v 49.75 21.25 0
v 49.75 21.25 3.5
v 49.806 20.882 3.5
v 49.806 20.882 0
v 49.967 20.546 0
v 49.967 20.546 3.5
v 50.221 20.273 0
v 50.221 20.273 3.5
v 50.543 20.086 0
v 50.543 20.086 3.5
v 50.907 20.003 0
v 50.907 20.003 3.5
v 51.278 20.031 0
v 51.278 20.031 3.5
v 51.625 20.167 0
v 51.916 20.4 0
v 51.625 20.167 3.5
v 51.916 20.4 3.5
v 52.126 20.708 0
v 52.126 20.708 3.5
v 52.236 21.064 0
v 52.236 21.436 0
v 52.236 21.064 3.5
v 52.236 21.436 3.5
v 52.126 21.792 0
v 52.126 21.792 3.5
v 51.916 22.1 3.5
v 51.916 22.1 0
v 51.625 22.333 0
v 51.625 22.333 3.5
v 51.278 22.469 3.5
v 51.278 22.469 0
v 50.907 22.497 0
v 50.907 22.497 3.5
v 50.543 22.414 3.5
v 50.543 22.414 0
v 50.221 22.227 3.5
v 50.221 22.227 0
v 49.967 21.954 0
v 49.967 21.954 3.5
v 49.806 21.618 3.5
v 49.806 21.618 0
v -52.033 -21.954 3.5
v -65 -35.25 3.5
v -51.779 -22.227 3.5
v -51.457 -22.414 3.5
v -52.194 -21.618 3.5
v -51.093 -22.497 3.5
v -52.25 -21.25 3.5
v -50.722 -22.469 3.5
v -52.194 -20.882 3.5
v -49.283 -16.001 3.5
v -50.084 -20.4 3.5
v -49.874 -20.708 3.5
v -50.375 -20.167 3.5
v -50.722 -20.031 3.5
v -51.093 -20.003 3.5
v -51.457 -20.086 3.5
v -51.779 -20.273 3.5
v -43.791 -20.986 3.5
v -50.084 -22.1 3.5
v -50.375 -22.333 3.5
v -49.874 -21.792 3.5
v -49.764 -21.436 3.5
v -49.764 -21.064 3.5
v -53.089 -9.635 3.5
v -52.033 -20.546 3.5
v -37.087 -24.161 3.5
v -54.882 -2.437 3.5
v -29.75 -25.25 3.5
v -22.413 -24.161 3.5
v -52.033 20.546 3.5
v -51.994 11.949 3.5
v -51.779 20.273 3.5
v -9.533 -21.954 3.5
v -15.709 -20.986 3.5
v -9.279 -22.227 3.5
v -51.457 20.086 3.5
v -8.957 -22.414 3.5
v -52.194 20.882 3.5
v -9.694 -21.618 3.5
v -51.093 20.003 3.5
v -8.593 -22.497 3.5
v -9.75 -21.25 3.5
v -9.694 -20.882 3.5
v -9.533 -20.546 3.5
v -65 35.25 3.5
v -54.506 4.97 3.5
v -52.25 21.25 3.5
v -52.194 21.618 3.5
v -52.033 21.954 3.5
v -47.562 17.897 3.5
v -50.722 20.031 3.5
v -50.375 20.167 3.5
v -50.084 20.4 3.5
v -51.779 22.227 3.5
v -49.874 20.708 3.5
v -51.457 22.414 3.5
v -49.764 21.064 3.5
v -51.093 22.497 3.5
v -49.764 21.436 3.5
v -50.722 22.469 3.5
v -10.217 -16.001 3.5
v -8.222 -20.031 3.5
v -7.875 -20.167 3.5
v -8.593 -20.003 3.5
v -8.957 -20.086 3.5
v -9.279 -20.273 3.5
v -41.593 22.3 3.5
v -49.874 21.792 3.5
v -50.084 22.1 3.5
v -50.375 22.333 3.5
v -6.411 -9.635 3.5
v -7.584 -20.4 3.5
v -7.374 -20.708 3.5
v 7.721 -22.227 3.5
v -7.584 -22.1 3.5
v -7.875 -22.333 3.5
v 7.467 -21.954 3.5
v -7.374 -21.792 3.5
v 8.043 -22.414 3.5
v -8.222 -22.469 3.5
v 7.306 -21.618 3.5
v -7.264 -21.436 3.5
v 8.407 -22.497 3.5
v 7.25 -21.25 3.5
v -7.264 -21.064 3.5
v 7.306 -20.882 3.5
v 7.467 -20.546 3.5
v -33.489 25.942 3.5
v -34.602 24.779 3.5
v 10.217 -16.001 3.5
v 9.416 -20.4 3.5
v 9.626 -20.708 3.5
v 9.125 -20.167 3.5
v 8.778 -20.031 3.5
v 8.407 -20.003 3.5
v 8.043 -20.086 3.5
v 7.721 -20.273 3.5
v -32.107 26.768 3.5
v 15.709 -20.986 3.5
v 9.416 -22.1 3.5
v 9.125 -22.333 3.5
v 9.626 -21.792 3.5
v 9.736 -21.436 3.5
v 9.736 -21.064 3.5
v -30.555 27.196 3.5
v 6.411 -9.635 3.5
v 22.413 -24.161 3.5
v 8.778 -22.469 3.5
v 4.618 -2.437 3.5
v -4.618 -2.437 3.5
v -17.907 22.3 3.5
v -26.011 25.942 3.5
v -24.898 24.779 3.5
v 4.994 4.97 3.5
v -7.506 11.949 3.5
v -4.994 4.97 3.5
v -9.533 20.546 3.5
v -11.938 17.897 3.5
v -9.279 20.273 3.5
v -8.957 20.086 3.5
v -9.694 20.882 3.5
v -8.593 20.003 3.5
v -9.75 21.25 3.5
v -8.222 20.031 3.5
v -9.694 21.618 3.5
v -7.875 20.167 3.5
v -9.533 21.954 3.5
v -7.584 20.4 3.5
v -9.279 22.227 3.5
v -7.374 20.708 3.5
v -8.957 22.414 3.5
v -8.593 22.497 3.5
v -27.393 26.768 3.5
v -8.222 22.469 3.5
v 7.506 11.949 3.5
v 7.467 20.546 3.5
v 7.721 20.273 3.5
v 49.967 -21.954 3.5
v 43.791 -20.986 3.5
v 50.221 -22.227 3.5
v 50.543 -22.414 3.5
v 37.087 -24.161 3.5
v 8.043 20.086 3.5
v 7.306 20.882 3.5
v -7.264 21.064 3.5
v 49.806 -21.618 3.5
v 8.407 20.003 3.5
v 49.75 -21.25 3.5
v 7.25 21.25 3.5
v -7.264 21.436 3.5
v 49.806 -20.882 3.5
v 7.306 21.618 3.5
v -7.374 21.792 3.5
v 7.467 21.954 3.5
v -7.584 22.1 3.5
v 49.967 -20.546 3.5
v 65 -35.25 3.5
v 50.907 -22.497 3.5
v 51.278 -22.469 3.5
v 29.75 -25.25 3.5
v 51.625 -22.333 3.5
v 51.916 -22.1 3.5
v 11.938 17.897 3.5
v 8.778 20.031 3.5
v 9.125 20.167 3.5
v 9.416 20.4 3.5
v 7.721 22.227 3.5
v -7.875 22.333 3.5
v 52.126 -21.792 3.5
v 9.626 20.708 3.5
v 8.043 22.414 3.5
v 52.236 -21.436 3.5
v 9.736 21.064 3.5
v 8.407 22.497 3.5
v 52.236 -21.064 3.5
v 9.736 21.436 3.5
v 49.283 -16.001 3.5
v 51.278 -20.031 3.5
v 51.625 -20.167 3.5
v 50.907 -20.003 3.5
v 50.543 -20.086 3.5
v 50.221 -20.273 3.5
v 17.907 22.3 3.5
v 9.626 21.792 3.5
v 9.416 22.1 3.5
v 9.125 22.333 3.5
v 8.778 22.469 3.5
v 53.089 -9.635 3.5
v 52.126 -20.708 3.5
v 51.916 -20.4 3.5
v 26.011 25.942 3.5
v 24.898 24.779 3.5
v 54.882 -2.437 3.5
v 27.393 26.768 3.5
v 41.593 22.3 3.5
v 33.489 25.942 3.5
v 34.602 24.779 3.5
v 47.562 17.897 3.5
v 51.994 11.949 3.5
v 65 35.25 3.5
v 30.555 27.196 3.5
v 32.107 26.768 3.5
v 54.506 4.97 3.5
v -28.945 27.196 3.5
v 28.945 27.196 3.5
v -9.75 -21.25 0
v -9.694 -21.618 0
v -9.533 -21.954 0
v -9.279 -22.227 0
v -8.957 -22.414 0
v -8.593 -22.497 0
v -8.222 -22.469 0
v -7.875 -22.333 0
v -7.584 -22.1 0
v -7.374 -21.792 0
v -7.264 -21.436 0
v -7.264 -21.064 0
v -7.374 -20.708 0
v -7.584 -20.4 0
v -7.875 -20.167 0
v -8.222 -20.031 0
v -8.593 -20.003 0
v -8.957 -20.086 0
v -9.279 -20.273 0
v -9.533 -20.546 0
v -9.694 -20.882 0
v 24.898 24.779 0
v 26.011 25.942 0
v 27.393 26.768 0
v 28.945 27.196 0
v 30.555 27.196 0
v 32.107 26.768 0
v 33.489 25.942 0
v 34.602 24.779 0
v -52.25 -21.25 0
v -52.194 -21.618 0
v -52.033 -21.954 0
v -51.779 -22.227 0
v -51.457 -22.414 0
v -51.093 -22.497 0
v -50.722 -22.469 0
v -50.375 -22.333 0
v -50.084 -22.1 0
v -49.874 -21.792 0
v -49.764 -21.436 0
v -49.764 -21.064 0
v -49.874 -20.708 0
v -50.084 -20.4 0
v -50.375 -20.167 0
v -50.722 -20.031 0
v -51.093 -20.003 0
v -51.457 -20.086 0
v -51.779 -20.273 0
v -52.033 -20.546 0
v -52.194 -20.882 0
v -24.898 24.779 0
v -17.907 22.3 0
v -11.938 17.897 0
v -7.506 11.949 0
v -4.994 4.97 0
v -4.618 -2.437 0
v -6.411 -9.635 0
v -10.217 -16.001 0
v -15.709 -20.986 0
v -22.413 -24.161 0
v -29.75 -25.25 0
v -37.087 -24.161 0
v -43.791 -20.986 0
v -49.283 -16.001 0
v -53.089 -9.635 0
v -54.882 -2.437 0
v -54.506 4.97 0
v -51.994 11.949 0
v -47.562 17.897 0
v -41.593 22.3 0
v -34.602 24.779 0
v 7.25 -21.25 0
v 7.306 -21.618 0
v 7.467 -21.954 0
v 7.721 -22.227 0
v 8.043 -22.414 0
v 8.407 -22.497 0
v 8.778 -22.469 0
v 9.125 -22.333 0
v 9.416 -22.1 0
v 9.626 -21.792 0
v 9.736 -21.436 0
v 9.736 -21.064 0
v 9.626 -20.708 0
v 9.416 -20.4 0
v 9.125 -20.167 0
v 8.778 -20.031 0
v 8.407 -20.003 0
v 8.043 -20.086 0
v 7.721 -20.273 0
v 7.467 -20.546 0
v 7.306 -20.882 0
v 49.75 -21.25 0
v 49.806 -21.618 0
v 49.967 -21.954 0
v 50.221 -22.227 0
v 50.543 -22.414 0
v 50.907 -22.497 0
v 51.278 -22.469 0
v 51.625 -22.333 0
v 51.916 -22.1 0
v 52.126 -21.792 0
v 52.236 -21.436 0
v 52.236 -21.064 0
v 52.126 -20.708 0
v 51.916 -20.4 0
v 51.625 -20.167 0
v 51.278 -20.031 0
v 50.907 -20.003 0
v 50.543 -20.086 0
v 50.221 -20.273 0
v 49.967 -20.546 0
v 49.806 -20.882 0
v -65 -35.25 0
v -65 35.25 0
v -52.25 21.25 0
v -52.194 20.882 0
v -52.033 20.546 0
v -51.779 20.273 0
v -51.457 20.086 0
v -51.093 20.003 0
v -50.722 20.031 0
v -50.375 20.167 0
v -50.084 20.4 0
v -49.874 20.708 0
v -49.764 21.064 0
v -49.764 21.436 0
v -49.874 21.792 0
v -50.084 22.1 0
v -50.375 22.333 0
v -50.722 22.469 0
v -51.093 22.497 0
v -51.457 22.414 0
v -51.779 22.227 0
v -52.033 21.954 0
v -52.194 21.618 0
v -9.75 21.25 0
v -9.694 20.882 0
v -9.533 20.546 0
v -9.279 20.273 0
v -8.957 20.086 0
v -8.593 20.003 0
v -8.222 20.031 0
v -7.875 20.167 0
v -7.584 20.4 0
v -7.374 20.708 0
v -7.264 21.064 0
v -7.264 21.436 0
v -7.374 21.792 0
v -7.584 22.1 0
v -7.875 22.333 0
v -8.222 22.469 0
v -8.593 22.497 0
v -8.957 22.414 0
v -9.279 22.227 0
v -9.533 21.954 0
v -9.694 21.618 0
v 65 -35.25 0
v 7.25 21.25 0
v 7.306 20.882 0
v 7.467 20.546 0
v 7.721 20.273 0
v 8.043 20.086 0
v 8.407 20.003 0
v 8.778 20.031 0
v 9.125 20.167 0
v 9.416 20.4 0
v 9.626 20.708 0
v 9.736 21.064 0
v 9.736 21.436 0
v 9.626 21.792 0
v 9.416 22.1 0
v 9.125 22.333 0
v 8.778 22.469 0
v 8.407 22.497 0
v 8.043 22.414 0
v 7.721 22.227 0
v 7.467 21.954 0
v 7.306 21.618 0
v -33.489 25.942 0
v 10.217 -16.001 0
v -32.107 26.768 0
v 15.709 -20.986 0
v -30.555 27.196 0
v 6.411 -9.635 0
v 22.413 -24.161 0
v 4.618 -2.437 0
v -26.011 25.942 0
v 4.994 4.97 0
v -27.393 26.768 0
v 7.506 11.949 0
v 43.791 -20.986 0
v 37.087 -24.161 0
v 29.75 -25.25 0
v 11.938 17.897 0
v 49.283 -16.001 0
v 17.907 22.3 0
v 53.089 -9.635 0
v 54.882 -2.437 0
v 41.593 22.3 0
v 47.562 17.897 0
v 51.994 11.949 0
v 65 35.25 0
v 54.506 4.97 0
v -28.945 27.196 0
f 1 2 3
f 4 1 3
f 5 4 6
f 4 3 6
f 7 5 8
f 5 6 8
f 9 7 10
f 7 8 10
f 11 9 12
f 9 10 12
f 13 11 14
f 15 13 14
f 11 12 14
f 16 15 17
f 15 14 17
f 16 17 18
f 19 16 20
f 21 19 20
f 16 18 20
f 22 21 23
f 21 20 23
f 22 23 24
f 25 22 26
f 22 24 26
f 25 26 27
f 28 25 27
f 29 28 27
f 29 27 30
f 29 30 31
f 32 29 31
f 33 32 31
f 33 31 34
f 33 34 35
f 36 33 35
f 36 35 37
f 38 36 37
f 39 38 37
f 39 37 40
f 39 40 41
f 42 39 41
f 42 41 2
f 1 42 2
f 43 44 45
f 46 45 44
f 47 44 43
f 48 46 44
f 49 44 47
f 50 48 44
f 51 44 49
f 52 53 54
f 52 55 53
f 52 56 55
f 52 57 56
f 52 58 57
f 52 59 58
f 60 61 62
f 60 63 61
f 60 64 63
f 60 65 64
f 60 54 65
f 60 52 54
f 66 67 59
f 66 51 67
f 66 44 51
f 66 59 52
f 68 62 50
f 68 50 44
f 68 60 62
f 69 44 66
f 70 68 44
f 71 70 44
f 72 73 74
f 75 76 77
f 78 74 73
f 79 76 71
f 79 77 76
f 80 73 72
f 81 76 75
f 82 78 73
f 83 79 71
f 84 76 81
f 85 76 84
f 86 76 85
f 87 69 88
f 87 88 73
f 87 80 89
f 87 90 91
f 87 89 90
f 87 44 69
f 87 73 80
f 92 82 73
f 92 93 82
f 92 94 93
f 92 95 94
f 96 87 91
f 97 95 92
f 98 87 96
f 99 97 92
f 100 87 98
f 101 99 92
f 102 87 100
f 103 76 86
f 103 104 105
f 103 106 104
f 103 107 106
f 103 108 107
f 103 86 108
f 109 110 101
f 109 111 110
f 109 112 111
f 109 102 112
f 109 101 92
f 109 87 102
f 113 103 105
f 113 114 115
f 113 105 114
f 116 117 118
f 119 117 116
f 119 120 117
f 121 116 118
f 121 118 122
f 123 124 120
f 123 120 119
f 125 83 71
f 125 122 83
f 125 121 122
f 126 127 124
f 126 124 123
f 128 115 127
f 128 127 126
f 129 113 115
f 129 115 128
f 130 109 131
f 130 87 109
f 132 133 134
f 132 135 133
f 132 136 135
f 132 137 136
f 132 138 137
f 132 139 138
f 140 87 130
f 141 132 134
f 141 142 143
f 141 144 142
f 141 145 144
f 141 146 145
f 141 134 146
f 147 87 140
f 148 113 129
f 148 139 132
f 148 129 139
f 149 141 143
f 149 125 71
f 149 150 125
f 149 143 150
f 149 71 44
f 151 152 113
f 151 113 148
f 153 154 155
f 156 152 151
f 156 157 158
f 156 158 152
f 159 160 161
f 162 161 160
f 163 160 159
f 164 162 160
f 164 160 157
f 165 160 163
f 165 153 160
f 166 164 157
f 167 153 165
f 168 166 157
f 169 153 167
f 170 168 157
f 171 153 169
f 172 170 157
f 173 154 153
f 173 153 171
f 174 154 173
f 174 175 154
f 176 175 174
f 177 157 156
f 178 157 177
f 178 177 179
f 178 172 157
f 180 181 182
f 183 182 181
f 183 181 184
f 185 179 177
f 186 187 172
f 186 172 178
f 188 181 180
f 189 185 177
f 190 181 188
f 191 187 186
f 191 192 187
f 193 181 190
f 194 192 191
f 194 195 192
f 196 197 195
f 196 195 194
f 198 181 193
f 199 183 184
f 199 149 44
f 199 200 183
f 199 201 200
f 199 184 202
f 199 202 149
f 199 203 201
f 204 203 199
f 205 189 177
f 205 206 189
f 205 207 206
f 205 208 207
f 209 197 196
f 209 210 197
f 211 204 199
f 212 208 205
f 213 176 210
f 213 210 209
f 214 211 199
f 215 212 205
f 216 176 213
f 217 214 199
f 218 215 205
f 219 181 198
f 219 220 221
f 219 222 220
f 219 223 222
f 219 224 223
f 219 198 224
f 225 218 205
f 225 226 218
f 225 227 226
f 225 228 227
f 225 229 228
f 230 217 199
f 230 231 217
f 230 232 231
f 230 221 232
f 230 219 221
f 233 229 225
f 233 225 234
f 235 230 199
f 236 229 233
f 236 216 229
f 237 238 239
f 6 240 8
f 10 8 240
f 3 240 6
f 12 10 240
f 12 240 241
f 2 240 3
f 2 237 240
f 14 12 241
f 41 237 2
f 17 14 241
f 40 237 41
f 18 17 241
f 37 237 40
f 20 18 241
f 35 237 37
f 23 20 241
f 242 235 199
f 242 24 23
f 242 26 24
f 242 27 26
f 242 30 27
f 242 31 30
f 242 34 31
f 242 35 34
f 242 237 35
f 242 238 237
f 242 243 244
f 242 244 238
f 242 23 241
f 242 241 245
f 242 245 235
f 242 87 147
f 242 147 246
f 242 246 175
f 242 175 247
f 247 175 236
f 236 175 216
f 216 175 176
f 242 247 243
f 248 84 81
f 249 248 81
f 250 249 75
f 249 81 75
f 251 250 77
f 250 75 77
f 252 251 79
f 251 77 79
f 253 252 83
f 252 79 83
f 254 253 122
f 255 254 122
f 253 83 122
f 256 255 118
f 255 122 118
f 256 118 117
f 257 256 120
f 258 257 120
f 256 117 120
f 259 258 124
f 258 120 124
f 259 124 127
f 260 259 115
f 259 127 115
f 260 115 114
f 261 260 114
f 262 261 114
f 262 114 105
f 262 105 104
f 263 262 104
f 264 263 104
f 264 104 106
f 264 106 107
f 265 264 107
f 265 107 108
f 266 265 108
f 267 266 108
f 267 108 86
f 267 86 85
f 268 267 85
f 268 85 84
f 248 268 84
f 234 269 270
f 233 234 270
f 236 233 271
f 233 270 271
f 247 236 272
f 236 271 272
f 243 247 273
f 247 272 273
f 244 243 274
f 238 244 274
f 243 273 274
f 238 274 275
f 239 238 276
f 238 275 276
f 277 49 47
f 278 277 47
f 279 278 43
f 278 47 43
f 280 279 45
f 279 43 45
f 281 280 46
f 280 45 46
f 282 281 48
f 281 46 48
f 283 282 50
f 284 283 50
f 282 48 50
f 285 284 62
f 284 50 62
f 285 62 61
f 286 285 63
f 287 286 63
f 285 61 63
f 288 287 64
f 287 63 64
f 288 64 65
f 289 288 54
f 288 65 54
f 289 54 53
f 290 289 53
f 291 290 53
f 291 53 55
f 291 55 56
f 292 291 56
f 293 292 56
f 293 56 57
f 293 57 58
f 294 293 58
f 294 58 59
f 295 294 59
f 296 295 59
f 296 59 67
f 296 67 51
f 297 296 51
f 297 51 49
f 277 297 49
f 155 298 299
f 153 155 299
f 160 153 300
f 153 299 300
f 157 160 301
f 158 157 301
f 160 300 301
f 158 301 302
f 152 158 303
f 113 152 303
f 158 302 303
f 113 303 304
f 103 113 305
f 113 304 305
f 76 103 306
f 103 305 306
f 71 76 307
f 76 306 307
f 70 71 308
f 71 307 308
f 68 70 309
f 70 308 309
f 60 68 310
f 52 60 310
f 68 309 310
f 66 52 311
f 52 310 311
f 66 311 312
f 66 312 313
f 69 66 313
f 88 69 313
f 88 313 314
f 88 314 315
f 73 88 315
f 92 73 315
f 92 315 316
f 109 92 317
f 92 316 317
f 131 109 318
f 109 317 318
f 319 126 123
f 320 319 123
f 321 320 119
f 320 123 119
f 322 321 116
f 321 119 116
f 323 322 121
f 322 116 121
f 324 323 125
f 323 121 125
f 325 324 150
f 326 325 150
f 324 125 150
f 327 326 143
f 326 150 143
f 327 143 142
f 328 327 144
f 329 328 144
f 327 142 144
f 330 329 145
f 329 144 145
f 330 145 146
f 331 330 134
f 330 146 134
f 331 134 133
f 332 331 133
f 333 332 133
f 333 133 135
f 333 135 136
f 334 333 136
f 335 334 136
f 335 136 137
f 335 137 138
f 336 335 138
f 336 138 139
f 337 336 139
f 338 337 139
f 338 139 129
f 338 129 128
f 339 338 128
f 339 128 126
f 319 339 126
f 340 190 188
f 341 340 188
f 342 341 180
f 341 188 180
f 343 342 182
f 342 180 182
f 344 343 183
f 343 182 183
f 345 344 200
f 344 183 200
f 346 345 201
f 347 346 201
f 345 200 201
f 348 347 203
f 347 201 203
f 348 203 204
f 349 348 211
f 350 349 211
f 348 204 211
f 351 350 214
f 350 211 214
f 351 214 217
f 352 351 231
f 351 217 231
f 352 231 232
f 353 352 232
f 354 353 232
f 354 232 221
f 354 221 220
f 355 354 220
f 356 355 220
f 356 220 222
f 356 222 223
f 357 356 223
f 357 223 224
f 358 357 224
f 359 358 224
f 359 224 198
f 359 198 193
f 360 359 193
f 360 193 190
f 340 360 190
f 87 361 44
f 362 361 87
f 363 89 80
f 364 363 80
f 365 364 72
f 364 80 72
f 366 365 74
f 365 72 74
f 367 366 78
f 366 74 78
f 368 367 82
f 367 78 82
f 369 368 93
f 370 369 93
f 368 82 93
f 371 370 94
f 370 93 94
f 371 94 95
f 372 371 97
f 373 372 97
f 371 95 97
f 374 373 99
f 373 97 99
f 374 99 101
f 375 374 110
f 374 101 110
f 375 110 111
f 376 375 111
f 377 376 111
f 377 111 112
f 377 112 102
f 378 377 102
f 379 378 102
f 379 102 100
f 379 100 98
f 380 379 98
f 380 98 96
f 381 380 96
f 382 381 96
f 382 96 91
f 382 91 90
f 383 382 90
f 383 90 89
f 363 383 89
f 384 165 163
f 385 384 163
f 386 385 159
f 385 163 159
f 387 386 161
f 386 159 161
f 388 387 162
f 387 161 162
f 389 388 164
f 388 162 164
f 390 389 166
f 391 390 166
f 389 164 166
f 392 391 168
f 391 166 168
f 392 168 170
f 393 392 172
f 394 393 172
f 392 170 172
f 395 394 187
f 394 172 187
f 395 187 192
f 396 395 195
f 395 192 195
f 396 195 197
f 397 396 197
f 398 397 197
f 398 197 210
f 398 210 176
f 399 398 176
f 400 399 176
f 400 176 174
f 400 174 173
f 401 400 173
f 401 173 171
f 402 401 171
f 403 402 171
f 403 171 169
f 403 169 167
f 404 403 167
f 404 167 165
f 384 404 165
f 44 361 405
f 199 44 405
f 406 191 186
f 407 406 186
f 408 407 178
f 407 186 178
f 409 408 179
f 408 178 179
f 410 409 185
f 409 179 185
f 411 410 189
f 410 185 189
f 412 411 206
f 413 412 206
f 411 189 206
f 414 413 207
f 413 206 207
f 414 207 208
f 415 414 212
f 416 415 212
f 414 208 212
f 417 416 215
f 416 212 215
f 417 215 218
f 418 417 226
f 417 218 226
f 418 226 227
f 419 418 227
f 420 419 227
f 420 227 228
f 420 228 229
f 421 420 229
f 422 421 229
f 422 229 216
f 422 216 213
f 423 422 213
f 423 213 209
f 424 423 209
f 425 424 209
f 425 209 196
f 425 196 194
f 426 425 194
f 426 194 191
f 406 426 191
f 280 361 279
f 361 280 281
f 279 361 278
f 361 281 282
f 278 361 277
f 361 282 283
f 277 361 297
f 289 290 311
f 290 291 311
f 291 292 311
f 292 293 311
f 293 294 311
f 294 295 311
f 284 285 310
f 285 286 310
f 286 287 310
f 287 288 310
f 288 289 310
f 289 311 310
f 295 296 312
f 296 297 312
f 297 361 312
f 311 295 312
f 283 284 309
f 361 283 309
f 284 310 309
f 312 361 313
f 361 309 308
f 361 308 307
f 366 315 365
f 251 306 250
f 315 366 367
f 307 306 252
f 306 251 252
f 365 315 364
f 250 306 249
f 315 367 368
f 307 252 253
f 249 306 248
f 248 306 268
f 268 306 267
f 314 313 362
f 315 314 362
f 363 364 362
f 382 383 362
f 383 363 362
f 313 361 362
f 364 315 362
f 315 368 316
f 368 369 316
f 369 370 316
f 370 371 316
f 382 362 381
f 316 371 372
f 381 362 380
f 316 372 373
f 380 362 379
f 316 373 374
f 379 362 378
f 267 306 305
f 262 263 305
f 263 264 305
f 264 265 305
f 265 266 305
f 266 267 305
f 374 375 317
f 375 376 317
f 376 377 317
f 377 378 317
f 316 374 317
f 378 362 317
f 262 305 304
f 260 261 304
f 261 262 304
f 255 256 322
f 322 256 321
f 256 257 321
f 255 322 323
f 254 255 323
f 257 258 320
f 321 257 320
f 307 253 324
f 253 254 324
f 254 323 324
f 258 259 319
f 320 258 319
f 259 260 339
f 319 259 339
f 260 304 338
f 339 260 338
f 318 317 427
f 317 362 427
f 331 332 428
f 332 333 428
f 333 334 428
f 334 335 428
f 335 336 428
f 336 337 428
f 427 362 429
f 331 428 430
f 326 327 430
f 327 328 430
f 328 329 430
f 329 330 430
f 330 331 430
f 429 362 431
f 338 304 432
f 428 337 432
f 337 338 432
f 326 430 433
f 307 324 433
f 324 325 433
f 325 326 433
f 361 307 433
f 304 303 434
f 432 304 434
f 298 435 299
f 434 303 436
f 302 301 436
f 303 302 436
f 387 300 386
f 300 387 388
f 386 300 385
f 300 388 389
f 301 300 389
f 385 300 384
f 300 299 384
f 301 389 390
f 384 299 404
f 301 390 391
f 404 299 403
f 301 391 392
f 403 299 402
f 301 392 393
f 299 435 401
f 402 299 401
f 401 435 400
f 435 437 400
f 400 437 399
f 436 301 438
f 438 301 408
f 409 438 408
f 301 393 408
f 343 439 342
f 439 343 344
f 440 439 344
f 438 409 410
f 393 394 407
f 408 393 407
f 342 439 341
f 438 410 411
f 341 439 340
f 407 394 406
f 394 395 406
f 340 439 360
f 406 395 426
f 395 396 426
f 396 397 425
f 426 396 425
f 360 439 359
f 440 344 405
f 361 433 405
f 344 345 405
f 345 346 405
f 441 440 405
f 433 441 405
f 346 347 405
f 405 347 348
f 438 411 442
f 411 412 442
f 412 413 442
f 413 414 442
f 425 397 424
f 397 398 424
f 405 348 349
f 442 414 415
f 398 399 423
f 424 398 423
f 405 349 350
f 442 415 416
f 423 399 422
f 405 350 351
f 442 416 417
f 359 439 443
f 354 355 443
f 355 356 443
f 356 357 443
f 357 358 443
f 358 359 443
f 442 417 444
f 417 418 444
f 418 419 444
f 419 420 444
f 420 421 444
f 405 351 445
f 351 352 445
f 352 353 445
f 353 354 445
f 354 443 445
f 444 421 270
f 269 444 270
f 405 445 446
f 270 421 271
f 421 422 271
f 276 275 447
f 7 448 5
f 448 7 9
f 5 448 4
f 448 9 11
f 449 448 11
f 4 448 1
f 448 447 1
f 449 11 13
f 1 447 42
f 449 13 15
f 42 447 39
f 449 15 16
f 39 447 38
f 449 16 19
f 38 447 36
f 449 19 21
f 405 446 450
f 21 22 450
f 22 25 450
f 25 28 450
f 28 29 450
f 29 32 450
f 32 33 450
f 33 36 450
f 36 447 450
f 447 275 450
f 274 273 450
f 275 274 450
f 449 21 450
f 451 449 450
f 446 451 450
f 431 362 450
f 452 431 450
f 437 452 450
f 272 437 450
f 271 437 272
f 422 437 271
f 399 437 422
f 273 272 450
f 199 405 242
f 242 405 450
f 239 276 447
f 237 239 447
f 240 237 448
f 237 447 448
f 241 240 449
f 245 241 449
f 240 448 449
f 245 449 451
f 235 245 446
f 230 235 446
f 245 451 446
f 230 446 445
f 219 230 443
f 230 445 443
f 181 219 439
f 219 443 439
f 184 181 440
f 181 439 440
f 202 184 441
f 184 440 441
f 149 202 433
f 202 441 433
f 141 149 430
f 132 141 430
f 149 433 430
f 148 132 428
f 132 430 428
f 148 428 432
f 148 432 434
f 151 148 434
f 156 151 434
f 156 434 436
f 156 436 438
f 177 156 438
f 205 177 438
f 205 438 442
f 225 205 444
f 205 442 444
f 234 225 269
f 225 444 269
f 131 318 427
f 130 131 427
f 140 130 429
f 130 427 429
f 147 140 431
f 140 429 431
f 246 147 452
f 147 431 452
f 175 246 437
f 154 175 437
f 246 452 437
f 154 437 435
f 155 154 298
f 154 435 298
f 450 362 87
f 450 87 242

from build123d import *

# Parameters (mm, degrees)
F0_W     = 130
F0_H     = 70.5
F1_DEPTH = 3.5
F2_D     = 2.5


# Not quite as in the source:
# - a feature names something its author has since deleted; it is built from what else it names


with BuildPart() as f1:
    # F0 (on Top) → F1 (new body)
    with BuildSketch(Plane.XY):
        Rectangle(F0_W, F0_H)
        with BuildLine():
            ThreePointArc((-24.8978610289, 24.7794117647), (-29.75, -25.25), (-34.6021389711, 24.7794117647))
            ThreePointArc((-34.6021389711, 24.7794117647), (-29.75, 27.25), (-24.8978610289, 24.7794117647))
        make_face(mode=Mode.SUBTRACT)
        with BuildLine():
            ThreePointArc((34.6021389711, 24.7794117647), (29.75, -25.25), (24.8978610289, 24.7794117647))
            ThreePointArc((24.8978610289, 24.7794117647), (29.75, 27.25), (34.6021389711, 24.7794117647))
        make_face(mode=Mode.SUBTRACT)
    extrude(amount=F1_DEPTH)

    # F2 (through all)
    with Locations(Plane(origin=(0, 0, 0), x_dir=(1, 0, 0), z_dir=(0, 0, -1))):
        with Locations((-51, -21.25), (-51, 21.25), (-8.5, 21.25), (-8.5, -21.25), (8.5, -21.25), (8.5, 21.25), (51, 21.25), (51, -21.25)):
            Hole(F2_D / 2)


solid = f1.part
